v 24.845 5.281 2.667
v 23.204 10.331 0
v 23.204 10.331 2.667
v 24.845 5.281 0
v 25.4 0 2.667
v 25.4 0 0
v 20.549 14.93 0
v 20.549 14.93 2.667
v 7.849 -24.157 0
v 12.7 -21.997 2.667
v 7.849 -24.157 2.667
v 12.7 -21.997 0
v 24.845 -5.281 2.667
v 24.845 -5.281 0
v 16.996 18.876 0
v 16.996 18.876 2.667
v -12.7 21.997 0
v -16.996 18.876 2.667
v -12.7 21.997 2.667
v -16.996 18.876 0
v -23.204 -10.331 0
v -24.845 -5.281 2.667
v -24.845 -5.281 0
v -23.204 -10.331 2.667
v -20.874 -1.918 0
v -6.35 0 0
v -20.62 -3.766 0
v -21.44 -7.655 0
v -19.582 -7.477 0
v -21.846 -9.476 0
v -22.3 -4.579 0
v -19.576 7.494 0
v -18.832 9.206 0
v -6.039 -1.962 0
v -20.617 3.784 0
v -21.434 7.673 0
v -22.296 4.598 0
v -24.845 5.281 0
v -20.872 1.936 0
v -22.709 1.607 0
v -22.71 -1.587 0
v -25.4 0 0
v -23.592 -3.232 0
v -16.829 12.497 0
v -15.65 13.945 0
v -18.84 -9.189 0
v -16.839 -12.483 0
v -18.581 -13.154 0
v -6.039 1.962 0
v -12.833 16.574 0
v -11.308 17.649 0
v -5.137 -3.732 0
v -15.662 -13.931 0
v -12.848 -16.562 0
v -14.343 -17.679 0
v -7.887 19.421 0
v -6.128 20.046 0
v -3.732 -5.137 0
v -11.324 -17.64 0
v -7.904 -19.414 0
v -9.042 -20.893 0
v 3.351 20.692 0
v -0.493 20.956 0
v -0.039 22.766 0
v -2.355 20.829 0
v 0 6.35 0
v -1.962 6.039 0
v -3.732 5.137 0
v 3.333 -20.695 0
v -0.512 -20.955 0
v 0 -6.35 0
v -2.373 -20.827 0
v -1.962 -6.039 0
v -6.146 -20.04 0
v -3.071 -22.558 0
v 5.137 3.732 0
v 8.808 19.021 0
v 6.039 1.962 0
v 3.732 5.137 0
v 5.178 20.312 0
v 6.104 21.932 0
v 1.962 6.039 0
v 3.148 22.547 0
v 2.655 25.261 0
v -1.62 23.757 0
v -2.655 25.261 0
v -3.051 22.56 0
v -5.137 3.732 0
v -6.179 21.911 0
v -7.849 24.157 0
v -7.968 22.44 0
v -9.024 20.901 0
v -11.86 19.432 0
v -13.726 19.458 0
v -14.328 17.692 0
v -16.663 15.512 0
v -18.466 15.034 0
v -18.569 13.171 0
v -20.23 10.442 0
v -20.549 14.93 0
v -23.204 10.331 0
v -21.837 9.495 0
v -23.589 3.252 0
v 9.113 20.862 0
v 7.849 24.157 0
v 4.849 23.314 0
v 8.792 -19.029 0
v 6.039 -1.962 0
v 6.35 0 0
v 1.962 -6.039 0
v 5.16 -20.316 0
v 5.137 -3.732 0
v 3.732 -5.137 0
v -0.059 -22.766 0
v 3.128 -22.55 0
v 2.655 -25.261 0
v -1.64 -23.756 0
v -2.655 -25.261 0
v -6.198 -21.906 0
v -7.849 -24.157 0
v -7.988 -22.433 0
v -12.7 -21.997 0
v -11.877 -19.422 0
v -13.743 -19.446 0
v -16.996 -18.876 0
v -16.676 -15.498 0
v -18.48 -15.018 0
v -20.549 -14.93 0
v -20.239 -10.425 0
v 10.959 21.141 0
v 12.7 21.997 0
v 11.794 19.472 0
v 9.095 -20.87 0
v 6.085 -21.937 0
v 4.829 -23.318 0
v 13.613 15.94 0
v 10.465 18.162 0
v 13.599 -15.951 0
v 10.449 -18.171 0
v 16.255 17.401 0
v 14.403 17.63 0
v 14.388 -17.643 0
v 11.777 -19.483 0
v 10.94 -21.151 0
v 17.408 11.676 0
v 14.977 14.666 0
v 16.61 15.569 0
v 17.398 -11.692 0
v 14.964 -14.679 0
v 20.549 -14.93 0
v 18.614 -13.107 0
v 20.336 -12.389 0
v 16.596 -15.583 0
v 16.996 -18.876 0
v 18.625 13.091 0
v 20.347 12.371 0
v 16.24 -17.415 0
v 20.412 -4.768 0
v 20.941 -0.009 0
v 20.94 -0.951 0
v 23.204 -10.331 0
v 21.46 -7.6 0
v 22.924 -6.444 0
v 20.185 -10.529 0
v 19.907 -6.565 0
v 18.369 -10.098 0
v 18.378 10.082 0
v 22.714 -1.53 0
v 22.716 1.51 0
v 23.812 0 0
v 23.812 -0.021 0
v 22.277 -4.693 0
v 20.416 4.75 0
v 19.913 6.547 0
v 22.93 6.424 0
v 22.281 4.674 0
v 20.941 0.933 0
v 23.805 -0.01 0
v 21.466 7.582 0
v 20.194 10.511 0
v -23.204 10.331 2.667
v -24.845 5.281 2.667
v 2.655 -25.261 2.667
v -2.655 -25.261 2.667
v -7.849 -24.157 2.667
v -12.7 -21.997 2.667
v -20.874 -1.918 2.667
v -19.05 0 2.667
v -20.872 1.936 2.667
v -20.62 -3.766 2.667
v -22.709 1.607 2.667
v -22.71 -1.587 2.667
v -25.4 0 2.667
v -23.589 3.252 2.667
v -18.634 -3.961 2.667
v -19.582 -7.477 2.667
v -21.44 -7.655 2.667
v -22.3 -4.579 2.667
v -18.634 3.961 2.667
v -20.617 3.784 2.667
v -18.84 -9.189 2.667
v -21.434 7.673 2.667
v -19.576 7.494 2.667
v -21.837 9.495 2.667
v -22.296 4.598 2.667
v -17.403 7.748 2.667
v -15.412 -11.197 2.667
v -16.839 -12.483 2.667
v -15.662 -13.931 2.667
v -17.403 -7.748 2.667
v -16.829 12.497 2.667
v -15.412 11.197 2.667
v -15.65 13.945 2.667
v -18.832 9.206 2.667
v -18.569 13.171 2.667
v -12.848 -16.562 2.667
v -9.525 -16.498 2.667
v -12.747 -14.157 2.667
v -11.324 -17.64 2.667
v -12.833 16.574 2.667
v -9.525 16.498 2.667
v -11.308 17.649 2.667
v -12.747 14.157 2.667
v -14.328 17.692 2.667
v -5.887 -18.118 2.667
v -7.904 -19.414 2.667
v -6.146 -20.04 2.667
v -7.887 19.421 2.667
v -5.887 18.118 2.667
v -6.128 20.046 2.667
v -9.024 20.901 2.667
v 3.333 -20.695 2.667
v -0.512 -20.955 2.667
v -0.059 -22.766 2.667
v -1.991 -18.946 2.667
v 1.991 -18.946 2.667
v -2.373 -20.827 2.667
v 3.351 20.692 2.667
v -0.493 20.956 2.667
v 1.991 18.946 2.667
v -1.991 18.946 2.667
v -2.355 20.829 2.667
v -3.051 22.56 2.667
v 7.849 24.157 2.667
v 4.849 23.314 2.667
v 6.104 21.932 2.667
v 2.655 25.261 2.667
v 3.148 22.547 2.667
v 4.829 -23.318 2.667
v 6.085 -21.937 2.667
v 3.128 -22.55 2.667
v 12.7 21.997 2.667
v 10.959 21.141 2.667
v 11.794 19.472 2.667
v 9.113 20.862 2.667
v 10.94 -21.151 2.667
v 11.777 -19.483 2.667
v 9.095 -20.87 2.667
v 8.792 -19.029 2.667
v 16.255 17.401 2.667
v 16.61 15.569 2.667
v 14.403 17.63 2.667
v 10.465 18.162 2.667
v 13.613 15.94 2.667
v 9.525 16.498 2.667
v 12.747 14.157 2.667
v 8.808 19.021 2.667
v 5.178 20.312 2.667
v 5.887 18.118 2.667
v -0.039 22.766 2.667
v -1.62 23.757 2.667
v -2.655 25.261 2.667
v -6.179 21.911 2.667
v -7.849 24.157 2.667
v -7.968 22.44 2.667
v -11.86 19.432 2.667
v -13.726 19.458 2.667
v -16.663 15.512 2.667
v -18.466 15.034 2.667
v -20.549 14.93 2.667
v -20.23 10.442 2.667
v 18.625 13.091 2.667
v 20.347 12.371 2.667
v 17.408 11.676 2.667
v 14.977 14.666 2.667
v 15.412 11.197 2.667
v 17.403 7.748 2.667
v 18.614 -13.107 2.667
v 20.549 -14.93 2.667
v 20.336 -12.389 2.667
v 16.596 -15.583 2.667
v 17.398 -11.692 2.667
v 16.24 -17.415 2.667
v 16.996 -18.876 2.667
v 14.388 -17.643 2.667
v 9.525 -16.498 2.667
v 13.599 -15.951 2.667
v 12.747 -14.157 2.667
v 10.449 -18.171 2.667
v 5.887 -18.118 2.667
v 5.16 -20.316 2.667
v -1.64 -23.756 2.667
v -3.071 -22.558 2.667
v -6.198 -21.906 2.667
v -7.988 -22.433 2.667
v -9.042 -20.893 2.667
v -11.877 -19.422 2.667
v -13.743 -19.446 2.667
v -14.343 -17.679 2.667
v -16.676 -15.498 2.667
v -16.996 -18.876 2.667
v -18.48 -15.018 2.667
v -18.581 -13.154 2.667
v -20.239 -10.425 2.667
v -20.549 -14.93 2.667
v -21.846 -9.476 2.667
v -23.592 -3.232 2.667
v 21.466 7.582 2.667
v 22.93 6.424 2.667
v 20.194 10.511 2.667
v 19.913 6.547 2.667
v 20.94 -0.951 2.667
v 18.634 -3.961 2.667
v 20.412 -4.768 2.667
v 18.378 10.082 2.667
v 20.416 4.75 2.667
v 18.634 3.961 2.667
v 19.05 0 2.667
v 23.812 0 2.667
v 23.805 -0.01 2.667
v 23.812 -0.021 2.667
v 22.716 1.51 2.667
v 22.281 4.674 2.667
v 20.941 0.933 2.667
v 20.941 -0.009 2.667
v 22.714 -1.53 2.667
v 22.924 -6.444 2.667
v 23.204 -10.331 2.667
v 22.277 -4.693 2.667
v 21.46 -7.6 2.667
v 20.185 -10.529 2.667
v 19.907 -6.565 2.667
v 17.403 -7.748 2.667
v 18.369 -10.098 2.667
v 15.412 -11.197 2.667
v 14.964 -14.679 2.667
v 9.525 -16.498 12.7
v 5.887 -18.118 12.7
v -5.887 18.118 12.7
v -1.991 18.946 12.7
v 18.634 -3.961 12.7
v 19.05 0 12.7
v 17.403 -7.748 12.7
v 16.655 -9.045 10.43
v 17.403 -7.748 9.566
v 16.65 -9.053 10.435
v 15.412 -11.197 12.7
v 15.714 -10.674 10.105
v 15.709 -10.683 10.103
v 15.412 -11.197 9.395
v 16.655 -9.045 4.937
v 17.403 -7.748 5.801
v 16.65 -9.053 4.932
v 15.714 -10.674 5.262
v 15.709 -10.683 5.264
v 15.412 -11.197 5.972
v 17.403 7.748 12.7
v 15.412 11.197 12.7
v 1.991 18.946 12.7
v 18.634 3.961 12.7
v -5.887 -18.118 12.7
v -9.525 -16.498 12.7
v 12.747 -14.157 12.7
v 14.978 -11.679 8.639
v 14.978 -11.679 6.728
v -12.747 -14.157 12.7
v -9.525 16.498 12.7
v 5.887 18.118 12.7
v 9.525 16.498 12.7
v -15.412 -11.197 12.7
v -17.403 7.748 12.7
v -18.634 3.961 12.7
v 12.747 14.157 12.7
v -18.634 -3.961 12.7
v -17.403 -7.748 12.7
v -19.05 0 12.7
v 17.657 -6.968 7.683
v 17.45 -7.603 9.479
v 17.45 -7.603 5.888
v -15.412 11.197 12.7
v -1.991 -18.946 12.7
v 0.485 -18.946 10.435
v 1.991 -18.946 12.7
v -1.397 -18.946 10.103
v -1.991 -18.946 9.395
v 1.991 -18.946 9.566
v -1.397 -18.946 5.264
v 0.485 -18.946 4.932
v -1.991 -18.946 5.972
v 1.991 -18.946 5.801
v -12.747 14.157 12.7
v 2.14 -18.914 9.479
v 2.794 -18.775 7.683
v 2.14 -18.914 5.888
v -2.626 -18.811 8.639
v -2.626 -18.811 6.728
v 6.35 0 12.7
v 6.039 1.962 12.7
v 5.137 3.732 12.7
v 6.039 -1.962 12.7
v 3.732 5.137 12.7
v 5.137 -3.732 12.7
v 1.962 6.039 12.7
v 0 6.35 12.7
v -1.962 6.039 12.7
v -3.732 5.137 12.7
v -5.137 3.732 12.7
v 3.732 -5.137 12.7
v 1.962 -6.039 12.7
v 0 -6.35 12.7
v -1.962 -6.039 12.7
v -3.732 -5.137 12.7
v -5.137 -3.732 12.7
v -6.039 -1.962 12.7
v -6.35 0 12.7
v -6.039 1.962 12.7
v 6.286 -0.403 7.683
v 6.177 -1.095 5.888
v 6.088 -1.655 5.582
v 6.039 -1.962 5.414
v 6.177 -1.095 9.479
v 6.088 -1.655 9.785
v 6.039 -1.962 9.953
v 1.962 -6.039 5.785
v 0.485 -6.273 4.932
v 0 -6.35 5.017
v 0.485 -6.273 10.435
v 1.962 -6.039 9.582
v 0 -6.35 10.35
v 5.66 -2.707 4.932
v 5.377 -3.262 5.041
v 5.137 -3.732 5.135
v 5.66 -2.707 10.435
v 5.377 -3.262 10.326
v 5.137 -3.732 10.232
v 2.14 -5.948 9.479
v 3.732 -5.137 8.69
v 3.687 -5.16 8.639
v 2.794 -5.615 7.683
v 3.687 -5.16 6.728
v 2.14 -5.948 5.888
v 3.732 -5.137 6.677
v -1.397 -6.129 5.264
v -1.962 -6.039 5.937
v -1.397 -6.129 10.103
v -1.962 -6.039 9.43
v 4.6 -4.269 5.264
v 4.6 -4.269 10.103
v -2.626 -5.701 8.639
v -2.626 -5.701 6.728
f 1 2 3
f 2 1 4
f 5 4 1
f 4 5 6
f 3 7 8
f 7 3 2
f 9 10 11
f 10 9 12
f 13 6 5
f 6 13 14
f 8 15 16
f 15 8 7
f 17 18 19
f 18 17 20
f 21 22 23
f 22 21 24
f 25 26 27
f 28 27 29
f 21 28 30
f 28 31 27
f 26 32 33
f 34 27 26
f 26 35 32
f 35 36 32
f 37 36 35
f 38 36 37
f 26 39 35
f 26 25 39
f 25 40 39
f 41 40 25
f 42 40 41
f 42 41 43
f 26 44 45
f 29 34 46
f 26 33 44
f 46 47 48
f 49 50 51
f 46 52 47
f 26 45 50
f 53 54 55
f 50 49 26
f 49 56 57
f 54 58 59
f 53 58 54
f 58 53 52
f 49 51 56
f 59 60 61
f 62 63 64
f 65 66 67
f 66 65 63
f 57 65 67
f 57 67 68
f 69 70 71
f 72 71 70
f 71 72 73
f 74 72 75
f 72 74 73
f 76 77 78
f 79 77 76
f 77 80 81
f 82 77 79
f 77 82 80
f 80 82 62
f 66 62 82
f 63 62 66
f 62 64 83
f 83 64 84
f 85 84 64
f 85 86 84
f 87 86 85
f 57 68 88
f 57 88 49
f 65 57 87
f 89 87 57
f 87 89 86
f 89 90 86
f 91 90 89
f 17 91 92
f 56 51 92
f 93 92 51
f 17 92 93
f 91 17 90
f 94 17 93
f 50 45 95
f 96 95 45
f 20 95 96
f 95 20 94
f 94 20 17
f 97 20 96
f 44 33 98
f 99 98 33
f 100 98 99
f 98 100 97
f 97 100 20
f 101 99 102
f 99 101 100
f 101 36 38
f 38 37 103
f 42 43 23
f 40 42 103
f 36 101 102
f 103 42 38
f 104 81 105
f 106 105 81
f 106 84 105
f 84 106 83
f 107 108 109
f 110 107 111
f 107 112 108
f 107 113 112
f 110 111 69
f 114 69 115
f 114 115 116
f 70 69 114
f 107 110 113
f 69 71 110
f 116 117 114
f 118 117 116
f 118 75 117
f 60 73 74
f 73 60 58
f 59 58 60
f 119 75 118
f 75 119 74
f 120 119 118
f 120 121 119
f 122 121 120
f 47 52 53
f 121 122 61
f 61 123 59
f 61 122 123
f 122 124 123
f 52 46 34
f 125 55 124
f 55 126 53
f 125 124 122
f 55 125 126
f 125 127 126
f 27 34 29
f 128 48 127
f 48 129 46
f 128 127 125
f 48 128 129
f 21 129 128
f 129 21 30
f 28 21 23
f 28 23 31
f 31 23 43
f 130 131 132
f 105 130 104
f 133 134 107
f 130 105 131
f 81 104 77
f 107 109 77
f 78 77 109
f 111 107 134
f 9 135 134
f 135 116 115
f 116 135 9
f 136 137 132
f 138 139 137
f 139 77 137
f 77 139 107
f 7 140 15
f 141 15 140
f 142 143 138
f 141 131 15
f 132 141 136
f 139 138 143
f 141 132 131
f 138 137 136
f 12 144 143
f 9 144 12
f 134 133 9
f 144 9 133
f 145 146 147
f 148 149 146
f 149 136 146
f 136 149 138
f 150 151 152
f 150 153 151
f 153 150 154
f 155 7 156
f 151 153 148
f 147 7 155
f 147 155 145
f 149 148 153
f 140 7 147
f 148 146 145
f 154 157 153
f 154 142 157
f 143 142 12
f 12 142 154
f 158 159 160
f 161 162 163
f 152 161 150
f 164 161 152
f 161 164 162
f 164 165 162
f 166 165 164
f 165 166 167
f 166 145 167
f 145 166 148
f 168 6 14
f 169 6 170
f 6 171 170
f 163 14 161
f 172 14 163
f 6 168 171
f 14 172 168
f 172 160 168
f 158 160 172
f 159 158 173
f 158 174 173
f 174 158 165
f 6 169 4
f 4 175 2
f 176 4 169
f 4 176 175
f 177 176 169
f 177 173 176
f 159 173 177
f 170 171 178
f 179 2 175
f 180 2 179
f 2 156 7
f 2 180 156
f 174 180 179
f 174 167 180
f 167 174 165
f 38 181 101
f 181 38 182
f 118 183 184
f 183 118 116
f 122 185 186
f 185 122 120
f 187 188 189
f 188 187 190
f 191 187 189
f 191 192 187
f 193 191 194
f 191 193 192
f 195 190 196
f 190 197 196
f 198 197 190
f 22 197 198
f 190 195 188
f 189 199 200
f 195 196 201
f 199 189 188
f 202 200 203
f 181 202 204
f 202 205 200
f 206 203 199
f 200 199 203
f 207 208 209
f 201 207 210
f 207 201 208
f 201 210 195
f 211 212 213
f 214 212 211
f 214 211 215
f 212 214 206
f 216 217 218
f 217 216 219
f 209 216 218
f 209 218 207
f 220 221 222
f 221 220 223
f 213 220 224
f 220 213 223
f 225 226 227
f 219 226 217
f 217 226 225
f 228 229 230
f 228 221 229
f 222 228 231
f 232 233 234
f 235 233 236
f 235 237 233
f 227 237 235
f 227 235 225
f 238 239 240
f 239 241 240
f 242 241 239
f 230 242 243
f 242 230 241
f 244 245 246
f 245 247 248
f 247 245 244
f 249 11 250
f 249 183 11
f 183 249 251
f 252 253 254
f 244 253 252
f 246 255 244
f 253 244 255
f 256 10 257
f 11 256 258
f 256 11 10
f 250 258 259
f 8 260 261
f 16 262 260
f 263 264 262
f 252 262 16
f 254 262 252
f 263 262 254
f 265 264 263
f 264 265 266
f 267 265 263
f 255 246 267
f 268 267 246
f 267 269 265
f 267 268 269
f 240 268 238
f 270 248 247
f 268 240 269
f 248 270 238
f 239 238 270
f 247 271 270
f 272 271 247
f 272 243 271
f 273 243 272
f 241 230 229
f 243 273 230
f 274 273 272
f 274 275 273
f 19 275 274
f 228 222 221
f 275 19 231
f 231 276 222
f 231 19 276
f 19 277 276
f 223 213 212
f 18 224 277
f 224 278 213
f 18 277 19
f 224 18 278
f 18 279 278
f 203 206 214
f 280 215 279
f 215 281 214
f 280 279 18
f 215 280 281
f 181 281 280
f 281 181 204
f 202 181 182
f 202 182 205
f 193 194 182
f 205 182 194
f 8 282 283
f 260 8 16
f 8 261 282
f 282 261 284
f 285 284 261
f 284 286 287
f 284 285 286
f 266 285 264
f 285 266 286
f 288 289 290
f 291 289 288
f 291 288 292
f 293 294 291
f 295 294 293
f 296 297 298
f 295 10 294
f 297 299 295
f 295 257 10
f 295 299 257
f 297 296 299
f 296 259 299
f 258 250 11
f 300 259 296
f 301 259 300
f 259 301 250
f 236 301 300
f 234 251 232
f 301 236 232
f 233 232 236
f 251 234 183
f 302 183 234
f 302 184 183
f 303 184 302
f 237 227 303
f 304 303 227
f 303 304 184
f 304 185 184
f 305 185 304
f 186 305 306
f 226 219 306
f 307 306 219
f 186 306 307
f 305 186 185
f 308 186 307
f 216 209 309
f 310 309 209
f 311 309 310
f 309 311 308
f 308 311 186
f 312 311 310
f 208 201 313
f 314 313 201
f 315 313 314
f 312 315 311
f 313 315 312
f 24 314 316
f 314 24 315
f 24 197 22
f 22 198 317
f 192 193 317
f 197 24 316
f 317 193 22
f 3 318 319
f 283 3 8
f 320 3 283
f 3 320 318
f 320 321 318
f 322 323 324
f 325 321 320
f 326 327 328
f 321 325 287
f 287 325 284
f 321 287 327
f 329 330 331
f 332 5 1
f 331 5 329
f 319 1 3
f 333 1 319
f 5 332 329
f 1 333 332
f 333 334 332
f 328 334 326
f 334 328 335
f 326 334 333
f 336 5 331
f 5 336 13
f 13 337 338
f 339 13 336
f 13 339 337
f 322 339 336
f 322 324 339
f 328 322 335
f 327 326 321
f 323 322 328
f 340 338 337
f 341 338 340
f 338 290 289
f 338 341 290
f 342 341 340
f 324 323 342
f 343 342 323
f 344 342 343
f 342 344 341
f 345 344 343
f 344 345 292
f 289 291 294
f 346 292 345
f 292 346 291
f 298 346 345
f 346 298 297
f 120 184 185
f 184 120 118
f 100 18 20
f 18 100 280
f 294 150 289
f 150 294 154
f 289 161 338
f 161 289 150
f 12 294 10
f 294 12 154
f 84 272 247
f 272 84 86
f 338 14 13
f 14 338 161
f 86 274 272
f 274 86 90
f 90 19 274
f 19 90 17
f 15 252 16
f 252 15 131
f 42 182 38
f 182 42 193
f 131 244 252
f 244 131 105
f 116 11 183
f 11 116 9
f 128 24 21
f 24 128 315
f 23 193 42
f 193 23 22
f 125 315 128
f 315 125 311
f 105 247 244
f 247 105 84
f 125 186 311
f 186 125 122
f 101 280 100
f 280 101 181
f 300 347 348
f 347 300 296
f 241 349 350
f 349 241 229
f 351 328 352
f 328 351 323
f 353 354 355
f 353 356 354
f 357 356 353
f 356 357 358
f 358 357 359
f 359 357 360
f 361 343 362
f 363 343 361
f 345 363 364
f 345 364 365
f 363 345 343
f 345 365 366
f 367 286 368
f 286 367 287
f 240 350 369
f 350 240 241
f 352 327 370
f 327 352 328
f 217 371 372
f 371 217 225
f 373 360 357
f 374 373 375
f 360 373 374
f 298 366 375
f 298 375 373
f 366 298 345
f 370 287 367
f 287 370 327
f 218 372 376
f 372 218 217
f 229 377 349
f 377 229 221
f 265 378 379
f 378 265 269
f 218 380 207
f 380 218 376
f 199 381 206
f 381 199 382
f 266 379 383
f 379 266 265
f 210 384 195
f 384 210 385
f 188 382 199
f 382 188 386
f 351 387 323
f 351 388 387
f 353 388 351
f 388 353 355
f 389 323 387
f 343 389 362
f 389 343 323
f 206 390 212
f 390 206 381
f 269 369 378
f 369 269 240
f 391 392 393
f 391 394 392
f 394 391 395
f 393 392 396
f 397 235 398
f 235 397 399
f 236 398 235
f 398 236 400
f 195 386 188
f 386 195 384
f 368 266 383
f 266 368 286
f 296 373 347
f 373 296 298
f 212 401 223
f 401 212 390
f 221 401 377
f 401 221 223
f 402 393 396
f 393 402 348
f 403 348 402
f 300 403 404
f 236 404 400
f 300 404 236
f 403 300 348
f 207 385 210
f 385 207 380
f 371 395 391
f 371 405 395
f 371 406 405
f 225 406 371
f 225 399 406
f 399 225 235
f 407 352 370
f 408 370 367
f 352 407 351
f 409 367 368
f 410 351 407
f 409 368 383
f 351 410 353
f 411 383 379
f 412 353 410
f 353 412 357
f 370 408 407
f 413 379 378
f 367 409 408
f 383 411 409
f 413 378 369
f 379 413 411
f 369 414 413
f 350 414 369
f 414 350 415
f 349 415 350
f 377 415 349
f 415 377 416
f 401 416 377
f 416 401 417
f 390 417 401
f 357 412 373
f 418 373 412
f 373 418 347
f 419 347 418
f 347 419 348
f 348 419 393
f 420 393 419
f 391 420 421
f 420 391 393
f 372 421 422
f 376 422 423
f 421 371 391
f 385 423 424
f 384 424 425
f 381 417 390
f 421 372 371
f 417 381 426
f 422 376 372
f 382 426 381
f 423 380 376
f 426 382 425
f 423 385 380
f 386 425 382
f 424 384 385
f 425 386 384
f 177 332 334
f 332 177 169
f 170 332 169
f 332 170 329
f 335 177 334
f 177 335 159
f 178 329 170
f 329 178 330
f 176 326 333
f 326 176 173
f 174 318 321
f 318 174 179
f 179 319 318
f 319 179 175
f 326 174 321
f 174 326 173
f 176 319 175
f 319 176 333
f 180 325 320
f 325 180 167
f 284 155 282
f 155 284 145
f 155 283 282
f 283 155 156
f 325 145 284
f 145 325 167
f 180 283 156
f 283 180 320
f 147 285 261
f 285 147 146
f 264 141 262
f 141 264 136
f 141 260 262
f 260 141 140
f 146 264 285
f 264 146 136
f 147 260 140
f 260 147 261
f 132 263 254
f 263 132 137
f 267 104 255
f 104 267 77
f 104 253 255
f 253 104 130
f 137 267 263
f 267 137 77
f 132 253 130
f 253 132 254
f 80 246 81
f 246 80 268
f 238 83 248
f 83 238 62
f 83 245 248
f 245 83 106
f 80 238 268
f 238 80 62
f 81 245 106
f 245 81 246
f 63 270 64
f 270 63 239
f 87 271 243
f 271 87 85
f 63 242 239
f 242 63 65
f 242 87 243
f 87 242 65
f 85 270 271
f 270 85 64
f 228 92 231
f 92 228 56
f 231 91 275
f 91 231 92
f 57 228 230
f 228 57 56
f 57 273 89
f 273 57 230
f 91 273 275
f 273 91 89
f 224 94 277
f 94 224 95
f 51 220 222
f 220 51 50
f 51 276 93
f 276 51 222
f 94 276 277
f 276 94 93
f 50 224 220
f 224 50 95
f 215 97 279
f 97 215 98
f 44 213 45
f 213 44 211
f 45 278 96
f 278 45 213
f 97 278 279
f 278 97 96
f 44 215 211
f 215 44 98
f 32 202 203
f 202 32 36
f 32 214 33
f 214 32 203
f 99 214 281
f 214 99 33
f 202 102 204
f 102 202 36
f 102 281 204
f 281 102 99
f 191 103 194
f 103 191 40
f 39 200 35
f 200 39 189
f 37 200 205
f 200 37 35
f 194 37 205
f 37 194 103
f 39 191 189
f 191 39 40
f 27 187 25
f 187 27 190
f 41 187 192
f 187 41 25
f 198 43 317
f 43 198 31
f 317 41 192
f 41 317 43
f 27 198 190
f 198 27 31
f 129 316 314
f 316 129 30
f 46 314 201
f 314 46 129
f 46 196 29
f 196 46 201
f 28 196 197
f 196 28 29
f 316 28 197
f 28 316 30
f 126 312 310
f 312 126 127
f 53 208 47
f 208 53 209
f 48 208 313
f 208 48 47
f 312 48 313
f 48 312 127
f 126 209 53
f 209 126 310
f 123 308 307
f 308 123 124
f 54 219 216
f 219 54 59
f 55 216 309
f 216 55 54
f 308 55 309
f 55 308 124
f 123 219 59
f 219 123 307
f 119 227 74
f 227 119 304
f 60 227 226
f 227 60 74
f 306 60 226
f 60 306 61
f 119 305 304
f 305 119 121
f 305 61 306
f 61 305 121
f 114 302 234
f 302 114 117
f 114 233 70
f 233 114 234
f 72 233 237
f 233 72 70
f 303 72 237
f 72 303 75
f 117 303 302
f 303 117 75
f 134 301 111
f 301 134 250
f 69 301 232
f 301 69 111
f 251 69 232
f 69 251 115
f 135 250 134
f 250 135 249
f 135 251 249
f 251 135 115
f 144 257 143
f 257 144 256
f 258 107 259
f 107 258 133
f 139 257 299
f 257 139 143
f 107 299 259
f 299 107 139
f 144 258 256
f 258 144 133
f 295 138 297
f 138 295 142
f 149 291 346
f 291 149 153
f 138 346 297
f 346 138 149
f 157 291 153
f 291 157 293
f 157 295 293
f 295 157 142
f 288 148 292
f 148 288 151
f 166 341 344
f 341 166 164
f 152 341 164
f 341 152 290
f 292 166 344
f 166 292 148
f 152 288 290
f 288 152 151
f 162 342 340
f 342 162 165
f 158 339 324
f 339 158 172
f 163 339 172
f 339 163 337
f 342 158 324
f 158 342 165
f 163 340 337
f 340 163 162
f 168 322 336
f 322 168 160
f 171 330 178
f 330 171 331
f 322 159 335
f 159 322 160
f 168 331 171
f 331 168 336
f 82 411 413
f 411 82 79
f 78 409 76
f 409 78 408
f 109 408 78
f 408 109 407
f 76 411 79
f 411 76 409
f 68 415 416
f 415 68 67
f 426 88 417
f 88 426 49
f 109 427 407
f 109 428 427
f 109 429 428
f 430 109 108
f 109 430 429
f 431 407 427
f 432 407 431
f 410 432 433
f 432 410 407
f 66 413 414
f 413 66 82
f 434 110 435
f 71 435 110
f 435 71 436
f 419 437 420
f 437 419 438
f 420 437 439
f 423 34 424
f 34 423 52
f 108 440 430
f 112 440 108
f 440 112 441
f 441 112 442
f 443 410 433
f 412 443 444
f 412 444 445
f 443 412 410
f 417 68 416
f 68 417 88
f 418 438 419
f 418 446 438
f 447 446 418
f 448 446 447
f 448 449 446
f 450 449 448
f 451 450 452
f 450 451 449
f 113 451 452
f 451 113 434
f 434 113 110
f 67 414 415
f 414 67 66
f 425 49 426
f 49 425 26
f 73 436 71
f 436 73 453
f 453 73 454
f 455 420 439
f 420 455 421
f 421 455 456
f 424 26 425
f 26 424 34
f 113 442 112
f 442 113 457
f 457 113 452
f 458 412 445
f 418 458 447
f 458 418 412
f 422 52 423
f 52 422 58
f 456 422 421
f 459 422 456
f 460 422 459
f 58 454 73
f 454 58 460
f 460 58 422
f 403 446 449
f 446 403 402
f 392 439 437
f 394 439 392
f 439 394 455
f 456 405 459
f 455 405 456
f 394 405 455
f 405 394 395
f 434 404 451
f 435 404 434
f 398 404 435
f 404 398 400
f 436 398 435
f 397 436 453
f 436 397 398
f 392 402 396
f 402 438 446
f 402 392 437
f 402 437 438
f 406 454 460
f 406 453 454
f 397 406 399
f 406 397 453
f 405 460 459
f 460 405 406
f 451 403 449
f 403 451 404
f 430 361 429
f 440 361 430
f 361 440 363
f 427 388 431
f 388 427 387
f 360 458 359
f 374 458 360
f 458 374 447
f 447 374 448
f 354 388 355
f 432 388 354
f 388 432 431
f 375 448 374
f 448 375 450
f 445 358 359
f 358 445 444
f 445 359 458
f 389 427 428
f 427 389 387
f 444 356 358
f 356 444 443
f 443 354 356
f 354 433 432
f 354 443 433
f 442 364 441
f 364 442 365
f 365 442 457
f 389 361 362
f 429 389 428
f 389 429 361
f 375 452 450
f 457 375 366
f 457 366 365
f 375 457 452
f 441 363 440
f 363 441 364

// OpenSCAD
function mm(i) = i*25.4 ;
thickness = mm(.5);
width = mm(1.5);
toothAngle = 15.65;



module base()
{
	union()
	{
		cylinder(mm(.105),mm(2)/2, mm(2)/2, 0);
		cylinder(thickness,width/2,width/2,0);
		
	}
		
}


module centerHole()
{
	cylinder(mm(thickness+mm(1)),mm(.5)/2, mm(.5)/2, 0);
}


module sideHole()
{
		{rotate([90, 0, 0]) {
		cylinder(mm(.75),mm(.22)/2,mm(.22)/2,0);
		}
	}
}


module triangle()
	difference(){
			translate([mm(7.4/8),0,0]) {
			rotate([0,0,90]){
				polyhedron( 
      	   	points = [ 
             	[-3, -2, 4], 
              	[3, -2, 4], 
              	[0, 3, 4], 
              	[-3, -2, -1], 
              	[3, -2, -1], 
              	[0, 3, -1]
        		 ],
        		 triangles = [
             	 [0, 1, 2],
             	 [3, 4, 5],
              	[0, 1, 4, 3],
              	[0, 2, 5, 3],
              	[1, 2, 5, 4]
        	 ]
   	 );
		}					
	}
		translate([mm(.62),mm(-.25/2),-mm(.1)]) {
  				cube([mm(.25),mm(.25),mm(.105+.2)]);
		}
}	


module toothgap()

{
union(){
	translate([mm(7/8),0,0])	{
		cylinder(mm(.2),mm(1/8)/2,mm(1/8)/2,0);
		}	
	triangle();
	
	}
}

module teeth()
{
	union(){
		toothgap();
		rotate([0, 0, toothAngle]) {
			toothgap();
		}
		rotate([0, 0, toothAngle*2]) {
			toothgap();
		}
	rotate([0, 0, toothAngle*3]) {
			toothgap();
		}
	rotate([0, 0, toothAngle*4]) {
			toothgap();
		}
	rotate([0, 0, toothAngle*5]) {
			toothgap();
		}
	rotate([0, 0, toothAngle*6]) {
			toothgap();
		}
	rotate([0, 0, toothAngle*7]) {
			toothgap();
		}
	rotate([0, 0, toothAngle*8]) {
			toothgap();
		}
	rotate([0, 0, toothAngle*9]) {
			toothgap();
		}
	rotate([0, 0, toothAngle*10]) {
			toothgap();
		}
	rotate([0, 0, toothAngle*11]) {
			toothgap();
		}
	rotate([0, 0, toothAngle*12]) {
			toothgap();
		}
	rotate([0, 0, toothAngle*13]) {
			toothgap();
		}
	rotate([0, 0, toothAngle*14]) {
			toothgap();
		}
	rotate([0, 0, toothAngle*15]) {
			toothgap();
		}
	rotate([0, 0, toothAngle*16]) {
			toothgap();
		}
	rotate([0, 0, toothAngle*17]) {
			toothgap();
		}
	rotate([0, 0, toothAngle*18]) {
			toothgap();
		}
	rotate([0, 0, toothAngle*19]) {
			toothgap();
		}
	rotate([0, 0, toothAngle*20]) {
			toothgap();
		}
	rotate([0, 0, toothAngle*21]) {
			toothgap();
		}
	rotate([0, 0, toothAngle*22]) {
			toothgap();
		}
	rotate([0, 0, toothAngle*23]) {
			toothgap();
		}
	}
}


module sprocket()
{
	difference(){
		base();
		translate([0,0,mm(-.5)]) {
			centerHole();
			}
		translate([0,0,(thickness/2+mm(.105)/2)]) {
			sideHole();
			}
		{rotate([0, 0, 60]) {
		translate([0,0,(thickness/2+mm(.105)/2)]) {
			sideHole();
				}
			}
		}
		teeth();


	}
}


sprocket();
